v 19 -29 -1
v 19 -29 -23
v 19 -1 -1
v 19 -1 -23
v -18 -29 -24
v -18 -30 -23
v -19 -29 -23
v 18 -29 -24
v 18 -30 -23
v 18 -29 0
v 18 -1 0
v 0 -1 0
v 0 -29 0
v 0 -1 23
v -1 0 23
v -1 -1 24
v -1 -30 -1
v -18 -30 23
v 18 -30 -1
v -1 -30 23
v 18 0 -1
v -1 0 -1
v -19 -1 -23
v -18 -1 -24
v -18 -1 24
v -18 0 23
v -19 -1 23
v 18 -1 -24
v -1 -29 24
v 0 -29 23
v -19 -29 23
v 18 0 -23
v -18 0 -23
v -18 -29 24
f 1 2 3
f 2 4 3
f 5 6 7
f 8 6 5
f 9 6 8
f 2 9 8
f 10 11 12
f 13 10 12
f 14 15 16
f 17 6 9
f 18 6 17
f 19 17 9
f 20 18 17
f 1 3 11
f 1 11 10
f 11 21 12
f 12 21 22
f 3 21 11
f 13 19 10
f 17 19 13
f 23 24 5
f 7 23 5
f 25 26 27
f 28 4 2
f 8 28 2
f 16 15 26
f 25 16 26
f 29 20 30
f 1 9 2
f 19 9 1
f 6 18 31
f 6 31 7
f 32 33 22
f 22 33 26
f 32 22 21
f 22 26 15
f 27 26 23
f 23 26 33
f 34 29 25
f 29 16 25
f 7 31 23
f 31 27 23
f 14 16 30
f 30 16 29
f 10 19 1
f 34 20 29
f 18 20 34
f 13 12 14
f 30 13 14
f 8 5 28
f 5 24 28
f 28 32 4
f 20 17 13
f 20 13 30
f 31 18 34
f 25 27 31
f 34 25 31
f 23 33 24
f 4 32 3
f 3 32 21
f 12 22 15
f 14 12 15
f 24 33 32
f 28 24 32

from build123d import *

# Parameters (mm, degrees)
F1_DEPTH = 30
F2_SIZE  = 1


# Not quite as in the source:
# - a feature names something its author has since deleted; it is built from what else it names


with BuildPart() as f1:
    # F0 (on Front) → F1 (new body)
    with BuildSketch(Plane.XZ):
        Polygon((19, 0), (0, 0), (0, 24), (-19, 24), (-19, -24), (19, -24), align=None)
    extrude(amount=F1_DEPTH)

    # F2
    f2_edges = [f1.edges().sort_by_distance(p)[0] for p in [
        (9.5, -30, 0),
        (0, -30, 12),
        (-9.5, -30, 24),
        (-19, -30, 0),
        (0, -30, -24),
        (19, -30, -12),
        (9.5, 0, 0),
        (0, 0, 12),
        (-9.5, 0, 24),
        (-19, 0, 0),
        (0, 0, -24),
        (19, 0, -12),
        (0, -15, 24),
        (-19, -15, 24),
        (-19, -15, -24),
        (19, -15, -24),
        (19, -15, 0),
    ]]
    chamfer(f2_edges, length=F2_SIZE)


solid = f1.part
